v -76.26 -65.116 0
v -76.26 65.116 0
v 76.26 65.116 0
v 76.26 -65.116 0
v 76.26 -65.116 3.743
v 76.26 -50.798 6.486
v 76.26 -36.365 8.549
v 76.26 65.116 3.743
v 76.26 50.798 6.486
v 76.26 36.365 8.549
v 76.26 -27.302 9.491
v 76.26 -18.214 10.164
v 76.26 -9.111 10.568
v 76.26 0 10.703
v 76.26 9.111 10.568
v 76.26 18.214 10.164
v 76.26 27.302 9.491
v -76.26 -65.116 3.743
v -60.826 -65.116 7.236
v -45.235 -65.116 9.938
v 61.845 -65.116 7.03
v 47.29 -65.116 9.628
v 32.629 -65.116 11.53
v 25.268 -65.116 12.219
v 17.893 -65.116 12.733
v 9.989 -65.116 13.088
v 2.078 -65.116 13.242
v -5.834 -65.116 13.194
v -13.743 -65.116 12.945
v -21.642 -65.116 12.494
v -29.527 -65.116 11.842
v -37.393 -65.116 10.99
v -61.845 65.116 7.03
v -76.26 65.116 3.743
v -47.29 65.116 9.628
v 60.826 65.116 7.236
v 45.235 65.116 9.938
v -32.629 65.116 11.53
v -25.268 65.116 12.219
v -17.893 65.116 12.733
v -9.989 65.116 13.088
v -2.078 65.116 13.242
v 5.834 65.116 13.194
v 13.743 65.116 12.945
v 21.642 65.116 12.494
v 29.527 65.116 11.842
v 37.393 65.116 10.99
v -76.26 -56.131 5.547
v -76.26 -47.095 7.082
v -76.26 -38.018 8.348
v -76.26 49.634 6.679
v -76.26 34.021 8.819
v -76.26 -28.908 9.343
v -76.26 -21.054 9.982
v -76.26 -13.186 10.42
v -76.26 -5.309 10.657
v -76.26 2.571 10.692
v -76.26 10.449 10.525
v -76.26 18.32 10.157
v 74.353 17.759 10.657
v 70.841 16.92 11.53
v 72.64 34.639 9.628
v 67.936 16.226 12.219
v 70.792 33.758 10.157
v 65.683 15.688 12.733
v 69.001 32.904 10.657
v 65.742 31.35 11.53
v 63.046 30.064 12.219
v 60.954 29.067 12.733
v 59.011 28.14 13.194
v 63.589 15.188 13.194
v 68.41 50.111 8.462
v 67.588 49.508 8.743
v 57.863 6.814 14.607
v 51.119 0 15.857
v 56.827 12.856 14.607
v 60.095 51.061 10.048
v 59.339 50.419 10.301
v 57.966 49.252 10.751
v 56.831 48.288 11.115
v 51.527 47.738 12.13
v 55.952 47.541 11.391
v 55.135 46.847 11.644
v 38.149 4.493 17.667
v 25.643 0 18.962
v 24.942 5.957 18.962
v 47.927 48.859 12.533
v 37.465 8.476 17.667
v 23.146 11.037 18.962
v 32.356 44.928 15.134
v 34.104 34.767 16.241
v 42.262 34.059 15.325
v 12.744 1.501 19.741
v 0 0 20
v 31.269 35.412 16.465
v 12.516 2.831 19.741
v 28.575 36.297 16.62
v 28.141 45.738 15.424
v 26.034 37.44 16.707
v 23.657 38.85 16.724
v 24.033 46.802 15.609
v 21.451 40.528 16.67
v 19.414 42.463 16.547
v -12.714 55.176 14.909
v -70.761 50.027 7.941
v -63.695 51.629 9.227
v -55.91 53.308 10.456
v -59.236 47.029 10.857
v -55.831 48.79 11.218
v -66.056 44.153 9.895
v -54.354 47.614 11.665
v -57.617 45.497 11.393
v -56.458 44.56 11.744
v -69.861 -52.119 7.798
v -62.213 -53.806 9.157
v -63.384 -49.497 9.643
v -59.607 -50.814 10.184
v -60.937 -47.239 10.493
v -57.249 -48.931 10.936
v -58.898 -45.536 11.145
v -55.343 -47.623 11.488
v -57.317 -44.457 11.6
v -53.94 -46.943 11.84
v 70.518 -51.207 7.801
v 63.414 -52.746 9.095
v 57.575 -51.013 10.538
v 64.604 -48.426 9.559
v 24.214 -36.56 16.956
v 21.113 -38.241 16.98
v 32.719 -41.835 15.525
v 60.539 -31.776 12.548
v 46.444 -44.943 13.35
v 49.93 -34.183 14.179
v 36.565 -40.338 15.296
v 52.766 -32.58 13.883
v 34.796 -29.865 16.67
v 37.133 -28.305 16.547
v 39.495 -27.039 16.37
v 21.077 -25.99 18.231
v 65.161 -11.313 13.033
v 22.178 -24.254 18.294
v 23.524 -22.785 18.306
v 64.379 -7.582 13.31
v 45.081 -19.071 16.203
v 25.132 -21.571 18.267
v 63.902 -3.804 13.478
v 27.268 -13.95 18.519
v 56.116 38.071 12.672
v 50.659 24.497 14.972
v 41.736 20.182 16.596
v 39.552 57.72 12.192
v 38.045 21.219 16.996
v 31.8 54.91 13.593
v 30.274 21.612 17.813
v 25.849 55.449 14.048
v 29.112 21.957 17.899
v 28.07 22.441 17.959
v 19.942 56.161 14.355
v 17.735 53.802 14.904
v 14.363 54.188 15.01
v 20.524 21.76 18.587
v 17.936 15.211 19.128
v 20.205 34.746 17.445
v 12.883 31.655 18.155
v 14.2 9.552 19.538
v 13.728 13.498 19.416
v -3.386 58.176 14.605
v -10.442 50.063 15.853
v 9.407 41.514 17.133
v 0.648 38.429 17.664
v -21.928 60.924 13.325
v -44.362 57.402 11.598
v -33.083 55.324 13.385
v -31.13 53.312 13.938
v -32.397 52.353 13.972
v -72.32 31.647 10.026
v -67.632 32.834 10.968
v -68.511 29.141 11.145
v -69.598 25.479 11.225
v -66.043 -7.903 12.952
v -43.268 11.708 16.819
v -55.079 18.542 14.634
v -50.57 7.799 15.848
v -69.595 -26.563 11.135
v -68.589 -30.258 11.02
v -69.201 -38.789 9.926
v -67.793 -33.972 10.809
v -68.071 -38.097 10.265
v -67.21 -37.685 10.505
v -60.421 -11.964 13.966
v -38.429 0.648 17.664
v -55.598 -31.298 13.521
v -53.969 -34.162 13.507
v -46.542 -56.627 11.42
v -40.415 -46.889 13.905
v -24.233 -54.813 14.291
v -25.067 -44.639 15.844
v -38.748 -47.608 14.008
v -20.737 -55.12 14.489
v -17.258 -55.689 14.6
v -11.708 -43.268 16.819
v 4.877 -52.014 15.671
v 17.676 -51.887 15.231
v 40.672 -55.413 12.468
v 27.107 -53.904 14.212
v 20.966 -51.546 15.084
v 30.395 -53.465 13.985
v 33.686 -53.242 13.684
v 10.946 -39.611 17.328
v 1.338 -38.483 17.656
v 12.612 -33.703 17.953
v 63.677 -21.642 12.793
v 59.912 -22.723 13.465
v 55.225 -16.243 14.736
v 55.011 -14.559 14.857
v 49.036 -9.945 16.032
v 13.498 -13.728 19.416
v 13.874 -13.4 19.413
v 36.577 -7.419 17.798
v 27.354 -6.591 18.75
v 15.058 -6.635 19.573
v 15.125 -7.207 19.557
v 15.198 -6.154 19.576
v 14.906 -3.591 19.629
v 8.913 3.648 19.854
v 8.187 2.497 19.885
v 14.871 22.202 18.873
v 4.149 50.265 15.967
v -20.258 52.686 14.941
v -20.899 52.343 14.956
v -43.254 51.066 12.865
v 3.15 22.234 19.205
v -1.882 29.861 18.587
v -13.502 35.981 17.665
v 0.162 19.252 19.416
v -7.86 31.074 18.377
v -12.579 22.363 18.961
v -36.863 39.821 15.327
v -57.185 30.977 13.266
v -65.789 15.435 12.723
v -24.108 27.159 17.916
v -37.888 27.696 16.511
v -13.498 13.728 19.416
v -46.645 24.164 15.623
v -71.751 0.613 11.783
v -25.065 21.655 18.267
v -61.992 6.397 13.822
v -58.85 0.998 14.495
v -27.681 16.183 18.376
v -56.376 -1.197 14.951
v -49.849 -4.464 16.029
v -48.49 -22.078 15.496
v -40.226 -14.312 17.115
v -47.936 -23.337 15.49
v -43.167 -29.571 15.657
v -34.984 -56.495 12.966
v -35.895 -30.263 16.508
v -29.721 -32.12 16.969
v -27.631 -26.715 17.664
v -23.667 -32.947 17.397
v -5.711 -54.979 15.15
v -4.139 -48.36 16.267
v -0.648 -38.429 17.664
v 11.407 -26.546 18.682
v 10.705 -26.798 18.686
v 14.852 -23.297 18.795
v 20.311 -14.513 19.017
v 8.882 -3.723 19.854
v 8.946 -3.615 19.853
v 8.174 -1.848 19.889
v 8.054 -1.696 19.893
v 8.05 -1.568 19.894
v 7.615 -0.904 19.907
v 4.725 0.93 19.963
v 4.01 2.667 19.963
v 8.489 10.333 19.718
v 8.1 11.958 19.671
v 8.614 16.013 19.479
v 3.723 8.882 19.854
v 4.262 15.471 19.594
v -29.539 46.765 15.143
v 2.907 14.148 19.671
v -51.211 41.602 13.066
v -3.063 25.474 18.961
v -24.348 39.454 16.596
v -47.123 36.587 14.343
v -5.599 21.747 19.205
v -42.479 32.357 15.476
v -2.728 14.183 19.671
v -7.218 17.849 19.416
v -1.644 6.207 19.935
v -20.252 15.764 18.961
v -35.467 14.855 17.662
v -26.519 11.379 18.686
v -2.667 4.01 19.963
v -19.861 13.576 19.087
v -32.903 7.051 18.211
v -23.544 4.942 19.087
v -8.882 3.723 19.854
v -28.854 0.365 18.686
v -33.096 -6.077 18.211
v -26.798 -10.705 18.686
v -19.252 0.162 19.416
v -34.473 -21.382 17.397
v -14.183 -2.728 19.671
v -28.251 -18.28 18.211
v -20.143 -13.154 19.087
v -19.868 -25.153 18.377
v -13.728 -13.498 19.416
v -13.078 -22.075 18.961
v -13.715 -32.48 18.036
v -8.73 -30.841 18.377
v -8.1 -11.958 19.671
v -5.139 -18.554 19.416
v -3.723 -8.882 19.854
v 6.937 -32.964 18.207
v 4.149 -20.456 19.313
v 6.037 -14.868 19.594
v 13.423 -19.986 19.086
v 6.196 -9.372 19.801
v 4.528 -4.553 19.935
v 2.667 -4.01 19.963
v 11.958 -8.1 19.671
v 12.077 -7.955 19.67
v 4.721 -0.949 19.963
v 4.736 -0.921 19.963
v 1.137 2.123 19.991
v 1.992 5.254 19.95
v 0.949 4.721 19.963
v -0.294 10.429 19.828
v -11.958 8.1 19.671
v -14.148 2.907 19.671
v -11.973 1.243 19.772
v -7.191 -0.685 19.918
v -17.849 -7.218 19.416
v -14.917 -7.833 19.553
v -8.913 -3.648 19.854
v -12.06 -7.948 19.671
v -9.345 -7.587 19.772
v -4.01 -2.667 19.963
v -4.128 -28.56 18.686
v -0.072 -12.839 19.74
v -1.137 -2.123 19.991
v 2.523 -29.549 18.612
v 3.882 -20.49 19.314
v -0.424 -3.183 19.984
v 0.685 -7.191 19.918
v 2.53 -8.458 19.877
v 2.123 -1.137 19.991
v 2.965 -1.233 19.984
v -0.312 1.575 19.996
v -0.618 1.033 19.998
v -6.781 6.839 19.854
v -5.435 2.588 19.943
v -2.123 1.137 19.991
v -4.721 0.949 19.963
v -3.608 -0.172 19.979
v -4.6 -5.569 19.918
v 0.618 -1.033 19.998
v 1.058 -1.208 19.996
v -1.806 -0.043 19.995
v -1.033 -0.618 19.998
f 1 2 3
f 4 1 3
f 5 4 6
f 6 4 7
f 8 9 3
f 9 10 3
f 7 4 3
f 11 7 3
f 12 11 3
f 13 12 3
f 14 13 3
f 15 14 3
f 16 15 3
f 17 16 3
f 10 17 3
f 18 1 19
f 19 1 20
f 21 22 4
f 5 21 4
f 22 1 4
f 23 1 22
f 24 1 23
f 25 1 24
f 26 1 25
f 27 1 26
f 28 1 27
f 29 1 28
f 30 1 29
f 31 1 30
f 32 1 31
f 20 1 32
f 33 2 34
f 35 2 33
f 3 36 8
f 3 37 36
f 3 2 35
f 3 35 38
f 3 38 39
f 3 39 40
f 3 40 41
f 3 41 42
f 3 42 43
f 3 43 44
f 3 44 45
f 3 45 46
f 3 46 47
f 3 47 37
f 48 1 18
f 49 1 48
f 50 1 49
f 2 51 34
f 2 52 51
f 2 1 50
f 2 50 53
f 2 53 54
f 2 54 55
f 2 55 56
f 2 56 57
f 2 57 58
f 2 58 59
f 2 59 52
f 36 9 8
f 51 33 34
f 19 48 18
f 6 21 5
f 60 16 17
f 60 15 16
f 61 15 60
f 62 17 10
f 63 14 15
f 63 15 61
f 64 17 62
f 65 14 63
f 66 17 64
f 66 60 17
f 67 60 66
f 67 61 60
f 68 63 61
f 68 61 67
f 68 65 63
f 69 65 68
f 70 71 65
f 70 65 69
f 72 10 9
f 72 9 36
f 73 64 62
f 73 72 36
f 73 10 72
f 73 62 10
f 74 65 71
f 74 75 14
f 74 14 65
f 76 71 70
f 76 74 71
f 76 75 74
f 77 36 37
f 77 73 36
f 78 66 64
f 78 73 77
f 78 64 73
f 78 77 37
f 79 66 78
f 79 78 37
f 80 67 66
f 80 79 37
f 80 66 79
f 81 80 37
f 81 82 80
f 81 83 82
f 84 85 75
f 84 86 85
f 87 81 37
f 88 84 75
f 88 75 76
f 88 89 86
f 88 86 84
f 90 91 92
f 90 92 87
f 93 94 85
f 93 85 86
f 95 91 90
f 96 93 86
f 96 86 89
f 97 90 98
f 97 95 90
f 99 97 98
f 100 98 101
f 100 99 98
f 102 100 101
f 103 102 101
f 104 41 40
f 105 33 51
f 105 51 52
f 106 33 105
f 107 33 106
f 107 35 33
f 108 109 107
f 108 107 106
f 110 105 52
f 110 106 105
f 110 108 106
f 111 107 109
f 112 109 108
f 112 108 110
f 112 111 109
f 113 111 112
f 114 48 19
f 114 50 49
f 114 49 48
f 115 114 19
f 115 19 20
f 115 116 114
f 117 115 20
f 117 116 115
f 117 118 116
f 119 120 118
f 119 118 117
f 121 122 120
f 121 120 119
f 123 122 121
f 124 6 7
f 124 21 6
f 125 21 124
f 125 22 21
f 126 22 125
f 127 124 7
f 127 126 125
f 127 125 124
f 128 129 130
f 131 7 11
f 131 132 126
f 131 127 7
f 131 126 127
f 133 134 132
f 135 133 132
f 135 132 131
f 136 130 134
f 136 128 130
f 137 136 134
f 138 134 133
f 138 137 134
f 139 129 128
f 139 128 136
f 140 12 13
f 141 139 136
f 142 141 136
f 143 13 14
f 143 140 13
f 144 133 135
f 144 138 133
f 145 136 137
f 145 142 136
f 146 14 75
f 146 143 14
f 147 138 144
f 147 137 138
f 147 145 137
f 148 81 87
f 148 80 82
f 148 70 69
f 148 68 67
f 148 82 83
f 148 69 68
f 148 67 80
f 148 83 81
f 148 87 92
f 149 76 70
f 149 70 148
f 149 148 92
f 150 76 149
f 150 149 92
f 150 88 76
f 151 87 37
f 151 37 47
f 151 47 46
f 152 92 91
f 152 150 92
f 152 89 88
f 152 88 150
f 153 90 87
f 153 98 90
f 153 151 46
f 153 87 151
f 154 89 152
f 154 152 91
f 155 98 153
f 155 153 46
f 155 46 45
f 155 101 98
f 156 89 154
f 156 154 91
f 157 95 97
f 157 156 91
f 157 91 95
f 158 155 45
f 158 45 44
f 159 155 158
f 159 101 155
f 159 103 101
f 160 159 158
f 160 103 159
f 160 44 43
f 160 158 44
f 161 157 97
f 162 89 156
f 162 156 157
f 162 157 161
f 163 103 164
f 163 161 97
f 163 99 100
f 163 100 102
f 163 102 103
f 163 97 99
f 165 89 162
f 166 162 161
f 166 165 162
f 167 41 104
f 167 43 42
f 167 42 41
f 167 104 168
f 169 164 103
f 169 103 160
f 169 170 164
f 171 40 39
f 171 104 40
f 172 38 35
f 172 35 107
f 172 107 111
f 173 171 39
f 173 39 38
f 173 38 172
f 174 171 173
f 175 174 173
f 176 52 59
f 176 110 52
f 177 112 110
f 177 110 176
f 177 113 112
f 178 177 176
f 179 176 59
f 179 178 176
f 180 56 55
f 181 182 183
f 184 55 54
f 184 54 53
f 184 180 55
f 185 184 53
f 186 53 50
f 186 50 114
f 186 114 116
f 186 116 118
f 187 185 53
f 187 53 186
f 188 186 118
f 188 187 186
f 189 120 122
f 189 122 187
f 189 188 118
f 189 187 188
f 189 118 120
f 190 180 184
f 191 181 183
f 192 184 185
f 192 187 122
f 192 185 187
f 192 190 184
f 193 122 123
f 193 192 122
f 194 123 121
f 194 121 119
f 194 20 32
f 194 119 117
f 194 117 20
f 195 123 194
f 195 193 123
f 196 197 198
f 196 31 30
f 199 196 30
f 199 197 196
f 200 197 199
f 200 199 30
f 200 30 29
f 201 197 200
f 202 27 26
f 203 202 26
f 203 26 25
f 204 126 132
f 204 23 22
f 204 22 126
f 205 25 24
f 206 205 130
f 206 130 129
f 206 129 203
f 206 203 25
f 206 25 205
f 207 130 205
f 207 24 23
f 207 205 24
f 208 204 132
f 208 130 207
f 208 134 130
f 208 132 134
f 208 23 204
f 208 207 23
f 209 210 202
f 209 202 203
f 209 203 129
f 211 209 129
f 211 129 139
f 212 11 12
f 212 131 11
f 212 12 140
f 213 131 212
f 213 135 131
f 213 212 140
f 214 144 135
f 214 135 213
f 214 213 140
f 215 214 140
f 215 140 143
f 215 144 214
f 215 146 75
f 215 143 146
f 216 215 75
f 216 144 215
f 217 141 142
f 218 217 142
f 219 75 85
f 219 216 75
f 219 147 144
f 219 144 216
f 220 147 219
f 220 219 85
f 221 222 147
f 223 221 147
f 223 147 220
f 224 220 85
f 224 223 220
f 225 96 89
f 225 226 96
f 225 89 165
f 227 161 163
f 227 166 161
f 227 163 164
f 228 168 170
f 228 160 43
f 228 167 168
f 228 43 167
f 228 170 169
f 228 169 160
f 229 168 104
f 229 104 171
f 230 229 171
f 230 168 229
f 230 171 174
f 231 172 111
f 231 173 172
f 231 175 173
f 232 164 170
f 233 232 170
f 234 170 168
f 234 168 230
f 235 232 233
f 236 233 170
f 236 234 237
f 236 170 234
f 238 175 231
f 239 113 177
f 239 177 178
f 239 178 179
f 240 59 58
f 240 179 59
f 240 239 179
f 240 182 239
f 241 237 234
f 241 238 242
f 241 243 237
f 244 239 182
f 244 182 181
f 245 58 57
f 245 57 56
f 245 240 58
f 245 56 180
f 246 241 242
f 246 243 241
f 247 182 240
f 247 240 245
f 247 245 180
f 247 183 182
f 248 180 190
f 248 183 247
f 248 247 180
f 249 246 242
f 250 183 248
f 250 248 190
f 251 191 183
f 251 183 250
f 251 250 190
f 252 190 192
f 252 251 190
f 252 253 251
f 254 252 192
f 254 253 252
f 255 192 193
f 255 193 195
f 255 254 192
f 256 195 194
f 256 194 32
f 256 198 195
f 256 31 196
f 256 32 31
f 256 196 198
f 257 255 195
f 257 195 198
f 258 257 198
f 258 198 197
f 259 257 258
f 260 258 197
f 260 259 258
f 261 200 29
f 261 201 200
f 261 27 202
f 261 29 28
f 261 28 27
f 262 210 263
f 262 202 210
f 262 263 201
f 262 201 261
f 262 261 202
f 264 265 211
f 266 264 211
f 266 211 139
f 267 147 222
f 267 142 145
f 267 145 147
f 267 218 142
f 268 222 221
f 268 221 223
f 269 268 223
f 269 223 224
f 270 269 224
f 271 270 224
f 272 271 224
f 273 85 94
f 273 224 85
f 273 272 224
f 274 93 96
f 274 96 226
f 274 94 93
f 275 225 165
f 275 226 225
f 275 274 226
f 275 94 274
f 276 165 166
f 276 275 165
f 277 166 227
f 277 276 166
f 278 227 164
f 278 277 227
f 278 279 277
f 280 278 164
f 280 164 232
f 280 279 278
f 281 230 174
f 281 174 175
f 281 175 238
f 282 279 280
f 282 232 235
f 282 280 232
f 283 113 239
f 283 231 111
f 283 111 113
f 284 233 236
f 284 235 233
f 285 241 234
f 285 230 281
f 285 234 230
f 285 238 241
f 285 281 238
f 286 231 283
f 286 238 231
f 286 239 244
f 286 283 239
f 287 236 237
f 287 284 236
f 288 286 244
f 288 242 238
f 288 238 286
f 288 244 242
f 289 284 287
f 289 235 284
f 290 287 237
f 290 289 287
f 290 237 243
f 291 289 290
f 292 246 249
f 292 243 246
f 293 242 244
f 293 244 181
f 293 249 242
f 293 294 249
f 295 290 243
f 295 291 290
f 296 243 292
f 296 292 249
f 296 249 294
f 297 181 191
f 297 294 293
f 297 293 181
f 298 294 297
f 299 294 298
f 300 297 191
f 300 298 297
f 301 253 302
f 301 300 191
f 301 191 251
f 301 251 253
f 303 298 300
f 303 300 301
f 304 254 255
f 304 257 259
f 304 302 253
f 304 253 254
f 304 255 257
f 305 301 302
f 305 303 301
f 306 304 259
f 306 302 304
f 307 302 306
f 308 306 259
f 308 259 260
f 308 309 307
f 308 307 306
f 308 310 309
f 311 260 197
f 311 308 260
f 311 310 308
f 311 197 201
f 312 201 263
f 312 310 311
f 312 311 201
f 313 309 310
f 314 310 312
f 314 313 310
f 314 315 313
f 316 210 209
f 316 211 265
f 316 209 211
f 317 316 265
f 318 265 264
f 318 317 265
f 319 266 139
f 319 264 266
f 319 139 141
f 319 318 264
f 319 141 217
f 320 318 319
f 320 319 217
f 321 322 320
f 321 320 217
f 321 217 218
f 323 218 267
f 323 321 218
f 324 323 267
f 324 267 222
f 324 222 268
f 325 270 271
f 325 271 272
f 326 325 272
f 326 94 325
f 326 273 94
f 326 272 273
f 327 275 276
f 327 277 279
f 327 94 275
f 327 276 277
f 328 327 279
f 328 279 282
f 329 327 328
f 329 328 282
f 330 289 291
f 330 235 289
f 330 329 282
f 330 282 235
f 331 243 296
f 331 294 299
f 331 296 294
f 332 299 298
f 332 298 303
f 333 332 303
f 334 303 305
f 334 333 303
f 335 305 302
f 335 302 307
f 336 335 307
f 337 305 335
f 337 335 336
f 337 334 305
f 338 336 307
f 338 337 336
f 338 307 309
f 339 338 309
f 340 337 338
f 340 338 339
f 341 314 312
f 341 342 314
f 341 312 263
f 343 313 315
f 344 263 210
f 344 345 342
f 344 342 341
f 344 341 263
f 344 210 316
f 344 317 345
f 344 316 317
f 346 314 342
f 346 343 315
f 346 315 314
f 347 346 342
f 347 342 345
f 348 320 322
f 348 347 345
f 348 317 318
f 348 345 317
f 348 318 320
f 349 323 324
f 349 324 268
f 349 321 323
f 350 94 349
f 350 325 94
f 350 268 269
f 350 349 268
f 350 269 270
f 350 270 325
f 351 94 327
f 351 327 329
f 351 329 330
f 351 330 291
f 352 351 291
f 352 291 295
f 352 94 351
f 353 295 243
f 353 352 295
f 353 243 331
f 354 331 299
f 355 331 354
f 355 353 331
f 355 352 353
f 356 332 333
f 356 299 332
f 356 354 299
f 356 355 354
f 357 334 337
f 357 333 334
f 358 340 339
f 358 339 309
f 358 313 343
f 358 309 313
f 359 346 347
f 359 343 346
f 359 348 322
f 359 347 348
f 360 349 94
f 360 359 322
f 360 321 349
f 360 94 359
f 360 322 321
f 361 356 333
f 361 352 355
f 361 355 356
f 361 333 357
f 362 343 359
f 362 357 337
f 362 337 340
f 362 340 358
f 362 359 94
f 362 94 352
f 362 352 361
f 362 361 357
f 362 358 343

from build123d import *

# Parameters (mm, degrees)
F2_W     = 152.519568
F2_H     = 130.232782
F3_DEPTH = 36.1


with BuildPart() as f1:
    # F0 (on Front) → F1 (revolve)
    with BuildSketch(Plane.XZ):
        with BuildLine():
            Line((0, 20), (0, -40))
            Line((0, -40), (185.709767, -40))
            ThreePointArc((185.709767, -40), (97.580887, 4.627748), (0, 20))
        make_face()
    revolve(axis=Axis((0, 0, -10), (0, 0, 1)))


with BuildPart() as f3:
    # F2 (on Top) → F3 (new body)
    with BuildSketch(Plane.XY):
        Rectangle(F2_W, F2_H)
    extrude(amount=F3_DEPTH)


with BuildPart() as f1_1:
    add(f1.part)

    # F4: intersect F3
    add(f3.part, mode=Mode.INTERSECT)


solid = f1_1.part
